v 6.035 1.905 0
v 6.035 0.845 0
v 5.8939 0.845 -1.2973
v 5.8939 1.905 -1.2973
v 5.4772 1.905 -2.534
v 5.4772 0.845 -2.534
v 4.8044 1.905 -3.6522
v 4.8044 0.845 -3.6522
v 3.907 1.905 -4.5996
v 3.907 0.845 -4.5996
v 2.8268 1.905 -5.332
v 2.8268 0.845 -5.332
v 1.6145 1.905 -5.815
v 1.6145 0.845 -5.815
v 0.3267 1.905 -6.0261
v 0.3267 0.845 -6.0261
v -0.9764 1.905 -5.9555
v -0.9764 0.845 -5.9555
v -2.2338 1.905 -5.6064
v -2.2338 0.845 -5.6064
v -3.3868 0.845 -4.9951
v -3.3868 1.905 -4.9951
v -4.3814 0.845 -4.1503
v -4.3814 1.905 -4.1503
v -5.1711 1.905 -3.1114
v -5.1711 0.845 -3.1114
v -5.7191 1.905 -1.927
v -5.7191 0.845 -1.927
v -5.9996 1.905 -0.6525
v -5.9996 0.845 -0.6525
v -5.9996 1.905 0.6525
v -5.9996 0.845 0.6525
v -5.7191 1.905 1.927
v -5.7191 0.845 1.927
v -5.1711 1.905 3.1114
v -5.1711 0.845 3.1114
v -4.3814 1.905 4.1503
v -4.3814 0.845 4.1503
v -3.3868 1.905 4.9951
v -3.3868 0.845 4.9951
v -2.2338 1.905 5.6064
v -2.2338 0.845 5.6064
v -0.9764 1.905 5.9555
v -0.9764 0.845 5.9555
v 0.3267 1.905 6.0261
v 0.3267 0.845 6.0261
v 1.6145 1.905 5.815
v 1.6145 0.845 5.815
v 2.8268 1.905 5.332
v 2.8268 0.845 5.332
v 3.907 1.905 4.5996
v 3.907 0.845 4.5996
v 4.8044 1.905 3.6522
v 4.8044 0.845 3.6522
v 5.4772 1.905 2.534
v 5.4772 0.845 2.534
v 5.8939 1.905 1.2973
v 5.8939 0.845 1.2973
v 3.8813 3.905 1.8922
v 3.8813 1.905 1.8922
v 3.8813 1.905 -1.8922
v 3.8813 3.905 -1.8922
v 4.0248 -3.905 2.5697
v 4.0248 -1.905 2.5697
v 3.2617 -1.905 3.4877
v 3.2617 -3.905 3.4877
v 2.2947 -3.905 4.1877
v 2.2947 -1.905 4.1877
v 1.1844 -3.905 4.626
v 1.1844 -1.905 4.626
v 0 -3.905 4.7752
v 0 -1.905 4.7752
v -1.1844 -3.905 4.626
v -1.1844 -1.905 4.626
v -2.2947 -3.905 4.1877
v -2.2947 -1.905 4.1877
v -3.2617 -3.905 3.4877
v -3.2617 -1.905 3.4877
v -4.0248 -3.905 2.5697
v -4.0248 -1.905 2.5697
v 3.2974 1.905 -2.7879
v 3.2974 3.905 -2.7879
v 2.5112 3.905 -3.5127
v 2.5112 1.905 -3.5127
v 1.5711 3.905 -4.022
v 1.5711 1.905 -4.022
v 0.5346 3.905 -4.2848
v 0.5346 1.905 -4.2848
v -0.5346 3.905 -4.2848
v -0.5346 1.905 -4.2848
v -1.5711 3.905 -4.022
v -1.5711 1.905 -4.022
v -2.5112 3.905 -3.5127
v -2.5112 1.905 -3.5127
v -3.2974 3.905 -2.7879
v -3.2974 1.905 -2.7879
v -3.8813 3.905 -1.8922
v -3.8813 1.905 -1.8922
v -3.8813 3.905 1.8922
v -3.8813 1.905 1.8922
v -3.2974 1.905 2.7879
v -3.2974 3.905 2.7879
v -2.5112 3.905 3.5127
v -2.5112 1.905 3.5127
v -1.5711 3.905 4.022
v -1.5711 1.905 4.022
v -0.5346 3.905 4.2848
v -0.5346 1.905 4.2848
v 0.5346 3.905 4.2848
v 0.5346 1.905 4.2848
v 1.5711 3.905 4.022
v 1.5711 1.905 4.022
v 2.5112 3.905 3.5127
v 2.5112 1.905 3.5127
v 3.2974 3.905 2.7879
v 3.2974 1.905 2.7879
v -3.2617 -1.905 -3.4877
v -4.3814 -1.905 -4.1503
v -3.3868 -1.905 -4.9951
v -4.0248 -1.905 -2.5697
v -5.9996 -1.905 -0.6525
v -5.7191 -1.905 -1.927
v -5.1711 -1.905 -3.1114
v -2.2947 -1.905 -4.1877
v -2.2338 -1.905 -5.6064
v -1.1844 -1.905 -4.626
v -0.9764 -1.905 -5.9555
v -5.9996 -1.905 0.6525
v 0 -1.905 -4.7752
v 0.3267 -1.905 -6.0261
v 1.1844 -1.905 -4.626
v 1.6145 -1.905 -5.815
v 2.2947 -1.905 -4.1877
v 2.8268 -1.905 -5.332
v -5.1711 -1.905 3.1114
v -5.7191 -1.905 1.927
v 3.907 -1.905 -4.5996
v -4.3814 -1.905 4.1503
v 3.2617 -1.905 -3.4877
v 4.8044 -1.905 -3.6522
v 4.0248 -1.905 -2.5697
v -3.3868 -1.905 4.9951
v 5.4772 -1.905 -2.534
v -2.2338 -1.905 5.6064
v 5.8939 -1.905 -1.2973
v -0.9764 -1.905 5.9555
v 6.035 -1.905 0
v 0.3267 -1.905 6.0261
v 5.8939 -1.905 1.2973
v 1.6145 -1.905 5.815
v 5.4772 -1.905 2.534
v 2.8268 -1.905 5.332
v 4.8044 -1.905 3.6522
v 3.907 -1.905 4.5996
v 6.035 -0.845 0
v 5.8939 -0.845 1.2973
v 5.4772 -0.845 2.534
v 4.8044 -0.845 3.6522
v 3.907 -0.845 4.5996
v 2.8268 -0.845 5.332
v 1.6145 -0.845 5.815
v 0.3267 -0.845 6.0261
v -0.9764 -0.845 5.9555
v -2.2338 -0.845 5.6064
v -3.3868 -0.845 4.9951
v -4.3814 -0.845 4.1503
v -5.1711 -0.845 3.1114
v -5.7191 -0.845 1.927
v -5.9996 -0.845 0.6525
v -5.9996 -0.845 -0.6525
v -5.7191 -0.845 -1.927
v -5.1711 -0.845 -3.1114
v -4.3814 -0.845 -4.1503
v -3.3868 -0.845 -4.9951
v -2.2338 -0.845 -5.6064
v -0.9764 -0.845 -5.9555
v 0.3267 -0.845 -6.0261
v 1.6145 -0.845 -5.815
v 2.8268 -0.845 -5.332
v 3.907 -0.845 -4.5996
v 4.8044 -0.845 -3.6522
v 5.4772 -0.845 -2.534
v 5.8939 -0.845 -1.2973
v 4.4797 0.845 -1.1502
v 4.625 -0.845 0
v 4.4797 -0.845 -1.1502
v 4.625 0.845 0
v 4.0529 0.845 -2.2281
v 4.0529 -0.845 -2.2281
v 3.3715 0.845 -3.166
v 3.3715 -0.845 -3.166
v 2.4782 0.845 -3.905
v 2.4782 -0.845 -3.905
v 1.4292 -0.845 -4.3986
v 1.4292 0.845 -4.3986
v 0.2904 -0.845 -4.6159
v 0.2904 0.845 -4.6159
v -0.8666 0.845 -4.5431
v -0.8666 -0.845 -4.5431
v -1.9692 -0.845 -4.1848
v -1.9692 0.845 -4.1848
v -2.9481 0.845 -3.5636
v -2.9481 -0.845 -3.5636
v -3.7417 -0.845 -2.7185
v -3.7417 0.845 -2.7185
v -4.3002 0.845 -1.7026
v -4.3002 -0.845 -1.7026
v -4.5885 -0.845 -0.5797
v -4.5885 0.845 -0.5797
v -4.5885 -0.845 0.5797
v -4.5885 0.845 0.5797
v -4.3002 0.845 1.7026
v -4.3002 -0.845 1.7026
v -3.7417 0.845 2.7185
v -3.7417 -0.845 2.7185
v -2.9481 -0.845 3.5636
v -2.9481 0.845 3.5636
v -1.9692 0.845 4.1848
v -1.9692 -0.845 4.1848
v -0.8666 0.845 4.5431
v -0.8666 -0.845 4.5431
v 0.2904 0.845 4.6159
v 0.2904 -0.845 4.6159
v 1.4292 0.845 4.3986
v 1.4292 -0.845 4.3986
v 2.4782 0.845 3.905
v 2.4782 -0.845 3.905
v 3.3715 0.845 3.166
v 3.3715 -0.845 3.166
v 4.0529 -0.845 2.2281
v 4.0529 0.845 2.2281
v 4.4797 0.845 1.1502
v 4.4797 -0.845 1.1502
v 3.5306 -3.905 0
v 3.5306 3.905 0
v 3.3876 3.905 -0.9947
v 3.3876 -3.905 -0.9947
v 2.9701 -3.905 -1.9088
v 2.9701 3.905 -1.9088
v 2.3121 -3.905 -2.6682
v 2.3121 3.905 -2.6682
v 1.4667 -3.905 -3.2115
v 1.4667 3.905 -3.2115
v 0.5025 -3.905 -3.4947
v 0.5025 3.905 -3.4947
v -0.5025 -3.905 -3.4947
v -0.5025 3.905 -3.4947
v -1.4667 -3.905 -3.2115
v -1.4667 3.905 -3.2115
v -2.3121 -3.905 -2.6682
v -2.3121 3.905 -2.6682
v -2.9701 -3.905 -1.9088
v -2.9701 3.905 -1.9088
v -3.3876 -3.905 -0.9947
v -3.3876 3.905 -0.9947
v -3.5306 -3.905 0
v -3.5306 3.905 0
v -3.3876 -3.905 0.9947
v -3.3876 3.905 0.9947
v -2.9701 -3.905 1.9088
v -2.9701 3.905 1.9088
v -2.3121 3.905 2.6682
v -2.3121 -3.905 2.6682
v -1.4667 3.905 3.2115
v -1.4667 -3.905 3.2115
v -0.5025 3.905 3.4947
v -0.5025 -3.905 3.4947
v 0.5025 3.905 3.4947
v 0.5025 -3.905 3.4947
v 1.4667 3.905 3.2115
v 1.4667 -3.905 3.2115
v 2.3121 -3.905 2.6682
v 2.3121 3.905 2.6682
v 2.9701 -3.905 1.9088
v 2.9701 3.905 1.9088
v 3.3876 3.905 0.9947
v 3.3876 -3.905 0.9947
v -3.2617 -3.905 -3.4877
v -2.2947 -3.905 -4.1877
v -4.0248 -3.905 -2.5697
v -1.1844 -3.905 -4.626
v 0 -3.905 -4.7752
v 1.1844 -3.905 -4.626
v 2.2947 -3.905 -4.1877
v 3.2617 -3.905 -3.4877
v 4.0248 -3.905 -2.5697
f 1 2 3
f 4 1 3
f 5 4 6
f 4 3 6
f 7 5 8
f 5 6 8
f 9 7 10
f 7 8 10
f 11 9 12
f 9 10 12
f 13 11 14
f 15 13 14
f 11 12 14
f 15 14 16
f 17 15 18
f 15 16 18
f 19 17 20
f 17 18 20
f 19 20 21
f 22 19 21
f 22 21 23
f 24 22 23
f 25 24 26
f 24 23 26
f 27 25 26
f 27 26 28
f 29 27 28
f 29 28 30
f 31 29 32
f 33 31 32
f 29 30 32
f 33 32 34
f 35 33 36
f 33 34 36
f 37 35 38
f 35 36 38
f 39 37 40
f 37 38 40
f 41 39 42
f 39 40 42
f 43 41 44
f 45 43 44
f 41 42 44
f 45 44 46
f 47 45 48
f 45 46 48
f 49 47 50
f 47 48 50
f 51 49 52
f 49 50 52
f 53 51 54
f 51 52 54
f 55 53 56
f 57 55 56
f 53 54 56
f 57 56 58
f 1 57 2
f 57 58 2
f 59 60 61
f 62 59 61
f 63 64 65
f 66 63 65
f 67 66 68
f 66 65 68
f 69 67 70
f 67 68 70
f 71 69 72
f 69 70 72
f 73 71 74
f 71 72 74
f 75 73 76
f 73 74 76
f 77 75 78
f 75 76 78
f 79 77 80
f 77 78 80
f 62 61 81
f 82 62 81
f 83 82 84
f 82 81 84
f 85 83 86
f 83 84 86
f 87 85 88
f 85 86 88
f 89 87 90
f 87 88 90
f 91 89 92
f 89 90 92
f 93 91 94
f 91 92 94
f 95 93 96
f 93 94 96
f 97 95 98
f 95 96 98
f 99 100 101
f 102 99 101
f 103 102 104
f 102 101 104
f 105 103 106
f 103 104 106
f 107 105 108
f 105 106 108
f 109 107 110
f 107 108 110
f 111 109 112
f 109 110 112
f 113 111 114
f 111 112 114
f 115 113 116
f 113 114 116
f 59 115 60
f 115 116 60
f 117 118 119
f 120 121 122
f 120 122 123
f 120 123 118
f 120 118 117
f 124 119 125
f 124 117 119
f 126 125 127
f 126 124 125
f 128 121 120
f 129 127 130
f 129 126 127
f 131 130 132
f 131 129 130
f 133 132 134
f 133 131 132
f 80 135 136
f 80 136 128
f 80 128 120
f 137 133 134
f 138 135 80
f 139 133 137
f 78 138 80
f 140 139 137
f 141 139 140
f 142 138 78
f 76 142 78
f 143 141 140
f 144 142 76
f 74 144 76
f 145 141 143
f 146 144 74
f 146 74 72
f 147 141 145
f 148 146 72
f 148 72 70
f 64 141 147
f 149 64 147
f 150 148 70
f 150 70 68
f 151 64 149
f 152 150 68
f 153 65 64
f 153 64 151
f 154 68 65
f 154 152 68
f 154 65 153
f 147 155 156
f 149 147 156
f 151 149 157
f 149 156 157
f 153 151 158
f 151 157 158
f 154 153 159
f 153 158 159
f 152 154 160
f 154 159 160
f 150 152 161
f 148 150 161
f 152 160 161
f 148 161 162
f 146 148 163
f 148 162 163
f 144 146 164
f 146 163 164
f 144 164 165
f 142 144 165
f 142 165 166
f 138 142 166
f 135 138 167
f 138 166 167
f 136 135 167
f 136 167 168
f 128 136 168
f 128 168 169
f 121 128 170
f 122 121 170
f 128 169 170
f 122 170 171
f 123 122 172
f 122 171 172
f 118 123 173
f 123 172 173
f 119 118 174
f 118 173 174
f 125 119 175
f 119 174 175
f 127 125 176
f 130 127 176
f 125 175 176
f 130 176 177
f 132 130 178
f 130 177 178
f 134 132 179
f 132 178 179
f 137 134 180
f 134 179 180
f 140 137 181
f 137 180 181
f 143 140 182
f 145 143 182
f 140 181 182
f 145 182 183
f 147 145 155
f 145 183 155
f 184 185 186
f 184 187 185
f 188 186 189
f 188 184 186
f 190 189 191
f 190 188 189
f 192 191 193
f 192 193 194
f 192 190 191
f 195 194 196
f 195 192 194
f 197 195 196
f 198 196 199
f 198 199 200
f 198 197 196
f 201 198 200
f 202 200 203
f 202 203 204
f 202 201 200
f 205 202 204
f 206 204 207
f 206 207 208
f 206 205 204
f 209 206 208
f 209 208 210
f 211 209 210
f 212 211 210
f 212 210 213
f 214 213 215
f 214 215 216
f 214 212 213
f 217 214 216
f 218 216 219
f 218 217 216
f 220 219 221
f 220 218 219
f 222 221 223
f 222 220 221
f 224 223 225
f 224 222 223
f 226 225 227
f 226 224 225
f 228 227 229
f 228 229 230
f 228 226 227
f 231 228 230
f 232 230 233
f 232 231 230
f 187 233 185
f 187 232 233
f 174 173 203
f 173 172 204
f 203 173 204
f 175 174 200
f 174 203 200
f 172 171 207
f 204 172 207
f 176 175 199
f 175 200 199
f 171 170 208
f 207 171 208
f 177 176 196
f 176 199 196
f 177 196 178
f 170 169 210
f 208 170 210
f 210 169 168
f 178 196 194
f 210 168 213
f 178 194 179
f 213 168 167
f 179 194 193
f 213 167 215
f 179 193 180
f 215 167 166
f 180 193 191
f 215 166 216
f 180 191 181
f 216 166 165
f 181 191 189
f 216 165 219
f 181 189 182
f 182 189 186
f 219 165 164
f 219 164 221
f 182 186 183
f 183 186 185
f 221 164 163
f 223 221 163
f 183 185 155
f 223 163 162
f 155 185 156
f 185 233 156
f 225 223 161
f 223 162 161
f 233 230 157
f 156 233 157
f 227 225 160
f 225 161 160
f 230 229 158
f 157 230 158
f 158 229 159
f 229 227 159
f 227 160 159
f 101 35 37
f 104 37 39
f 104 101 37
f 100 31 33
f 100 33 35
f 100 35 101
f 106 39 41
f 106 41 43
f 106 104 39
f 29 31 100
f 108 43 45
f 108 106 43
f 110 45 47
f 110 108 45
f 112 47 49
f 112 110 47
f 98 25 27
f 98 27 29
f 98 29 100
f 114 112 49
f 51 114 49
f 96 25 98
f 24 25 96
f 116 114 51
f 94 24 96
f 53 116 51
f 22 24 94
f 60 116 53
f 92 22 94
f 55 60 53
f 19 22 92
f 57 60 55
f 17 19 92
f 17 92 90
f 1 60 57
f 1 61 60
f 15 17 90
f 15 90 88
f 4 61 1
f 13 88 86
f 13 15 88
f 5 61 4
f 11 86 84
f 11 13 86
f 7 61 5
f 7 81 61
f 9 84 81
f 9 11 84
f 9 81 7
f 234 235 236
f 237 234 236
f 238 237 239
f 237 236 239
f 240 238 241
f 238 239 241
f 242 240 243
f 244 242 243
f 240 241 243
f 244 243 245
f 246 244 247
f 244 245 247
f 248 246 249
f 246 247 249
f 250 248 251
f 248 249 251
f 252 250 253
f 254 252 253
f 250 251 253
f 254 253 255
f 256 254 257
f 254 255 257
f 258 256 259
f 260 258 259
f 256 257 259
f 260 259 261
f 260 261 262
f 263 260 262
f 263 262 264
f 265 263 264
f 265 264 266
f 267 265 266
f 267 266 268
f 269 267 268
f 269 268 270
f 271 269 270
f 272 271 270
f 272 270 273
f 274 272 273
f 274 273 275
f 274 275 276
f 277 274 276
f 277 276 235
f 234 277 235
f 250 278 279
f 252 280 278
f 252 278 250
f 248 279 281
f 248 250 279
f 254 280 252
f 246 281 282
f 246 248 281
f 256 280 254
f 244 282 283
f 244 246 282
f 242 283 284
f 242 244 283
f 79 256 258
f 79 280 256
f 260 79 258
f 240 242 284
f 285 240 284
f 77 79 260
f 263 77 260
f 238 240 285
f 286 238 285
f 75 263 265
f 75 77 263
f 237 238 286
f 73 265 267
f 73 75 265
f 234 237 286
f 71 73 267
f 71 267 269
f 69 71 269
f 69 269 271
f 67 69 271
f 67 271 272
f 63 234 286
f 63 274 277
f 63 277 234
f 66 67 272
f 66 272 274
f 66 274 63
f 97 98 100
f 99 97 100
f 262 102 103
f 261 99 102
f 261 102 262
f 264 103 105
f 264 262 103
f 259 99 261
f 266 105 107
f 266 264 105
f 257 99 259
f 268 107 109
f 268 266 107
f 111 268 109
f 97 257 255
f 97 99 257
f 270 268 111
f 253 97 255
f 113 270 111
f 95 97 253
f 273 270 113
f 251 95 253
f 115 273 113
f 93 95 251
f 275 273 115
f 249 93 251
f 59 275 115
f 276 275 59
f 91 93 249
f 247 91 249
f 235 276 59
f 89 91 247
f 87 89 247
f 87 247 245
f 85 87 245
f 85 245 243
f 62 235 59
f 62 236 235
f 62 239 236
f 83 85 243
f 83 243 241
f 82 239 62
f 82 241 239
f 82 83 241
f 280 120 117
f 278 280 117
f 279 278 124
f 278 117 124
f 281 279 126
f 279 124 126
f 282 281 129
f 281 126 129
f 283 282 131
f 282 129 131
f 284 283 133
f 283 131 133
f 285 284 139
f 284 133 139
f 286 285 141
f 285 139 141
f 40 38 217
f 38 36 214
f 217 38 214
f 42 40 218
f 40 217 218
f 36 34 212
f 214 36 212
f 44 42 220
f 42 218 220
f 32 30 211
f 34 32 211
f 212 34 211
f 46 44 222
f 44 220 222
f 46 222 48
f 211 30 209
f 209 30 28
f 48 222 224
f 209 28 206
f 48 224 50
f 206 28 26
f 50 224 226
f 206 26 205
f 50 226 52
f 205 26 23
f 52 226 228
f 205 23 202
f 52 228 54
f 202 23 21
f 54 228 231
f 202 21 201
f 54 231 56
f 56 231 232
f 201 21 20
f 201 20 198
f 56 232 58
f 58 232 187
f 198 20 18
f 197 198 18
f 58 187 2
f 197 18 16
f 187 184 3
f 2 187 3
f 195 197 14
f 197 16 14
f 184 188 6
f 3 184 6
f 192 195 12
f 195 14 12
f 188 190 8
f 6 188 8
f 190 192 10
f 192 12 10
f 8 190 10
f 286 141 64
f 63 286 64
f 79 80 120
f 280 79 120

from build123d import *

# Parameters (mm, degrees)
SKETCH1_R           = 4.625
BOSS_EXTRUDE1_DEPTH = 0.845
SKETCH2_R           = 6.035
BOSS_EXTRUDE2_DEPTH = 1.06
SKETCH3_R           = 6.035
BOSS_EXTRUDE3_DEPTH = 1.06
BOSS_EXTRUDE4_DEPTH = 2
BOSS_EXTRUDE5_DEPTH = 2
SKETCH6_R           = 3.5306
CUT_EXTRUDE1_DEPTH  = 8.81


with BuildPart() as part:
    # Sketch1 → Boss-Extrude1 (new body, symmetric)
    with BuildSketch(Plane(origin=(0, 0, 0), x_dir=(1, 0, 0), z_dir=(0, 1, 0))):
        Circle(SKETCH1_R)
    extrude(amount=BOSS_EXTRUDE1_DEPTH, both=True)

    # Sketch2 → Boss-Extrude2 (add)
    with BuildSketch(Plane(origin=(0, 0.845, 0), x_dir=(1, 0, 0), z_dir=(0, 1, 0))):
        Circle(SKETCH2_R)
    extrude(amount=BOSS_EXTRUDE2_DEPTH)

    # Sketch3 → Boss-Extrude3 (add)
    with BuildSketch(Plane.XZ.offset(0.845)):
        Circle(SKETCH3_R)
    extrude(amount=BOSS_EXTRUDE3_DEPTH)

    # Sketch4 → Boss-Extrude4 (add)
    with BuildSketch(Plane(origin=(0, 1.905, 0), x_dir=(1, 0, 0), z_dir=(0, 1, 0))):
        with BuildLine():
            Line((-3.881348315, 1.892157303), (-3.881348315, 0))
            Line((-3.881348315, 0), (-3.881348315, -1.892157303))
            ThreePointArc((-3.881348315, -1.892157303), (0, -4.318), (3.881348315, -1.892157303))
            Line((3.881348315, -1.892157303), (3.881348315, 0))
            Line((3.881348315, 0), (3.881348315, 1.892157303))
            ThreePointArc((3.881348315, 1.892157303), (0, 4.318), (-3.881348315, 1.892157303))
        make_face()
    extrude(amount=BOSS_EXTRUDE4_DEPTH)

    # Sketch5 → Boss-Extrude5 (add)
    with BuildSketch(Plane.XZ.offset(1.905)):
        with BuildLine():
            Line((-4.024811429, 2.569713604), (-4.024811429, 0))
            Line((-4.024811429, 0), (-4.024811429, -2.569713604))
            ThreePointArc((-4.024811429, -2.569713604), (0, -4.7752), (4.024811429, -2.569713604))
            Line((4.024811429, -2.569713604), (4.024811429, 0))
            Line((4.024811429, 0), (4.024811429, 2.569713604))
            ThreePointArc((4.024811429, 2.569713604), (0, 4.7752), (-4.024811429, 2.569713604))
        make_face()
    extrude(amount=BOSS_EXTRUDE5_DEPTH)

    # Sketch6 → Cut-Extrude1 (cut, through all)
    with BuildSketch(Plane(origin=(0, 3.905, 0), x_dir=(1, 0, 0), z_dir=(0, 1, 0))):
        Circle(SKETCH6_R)
    extrude(amount=-CUT_EXTRUDE1_DEPTH, mode=Mode.SUBTRACT)


solid = part.part
